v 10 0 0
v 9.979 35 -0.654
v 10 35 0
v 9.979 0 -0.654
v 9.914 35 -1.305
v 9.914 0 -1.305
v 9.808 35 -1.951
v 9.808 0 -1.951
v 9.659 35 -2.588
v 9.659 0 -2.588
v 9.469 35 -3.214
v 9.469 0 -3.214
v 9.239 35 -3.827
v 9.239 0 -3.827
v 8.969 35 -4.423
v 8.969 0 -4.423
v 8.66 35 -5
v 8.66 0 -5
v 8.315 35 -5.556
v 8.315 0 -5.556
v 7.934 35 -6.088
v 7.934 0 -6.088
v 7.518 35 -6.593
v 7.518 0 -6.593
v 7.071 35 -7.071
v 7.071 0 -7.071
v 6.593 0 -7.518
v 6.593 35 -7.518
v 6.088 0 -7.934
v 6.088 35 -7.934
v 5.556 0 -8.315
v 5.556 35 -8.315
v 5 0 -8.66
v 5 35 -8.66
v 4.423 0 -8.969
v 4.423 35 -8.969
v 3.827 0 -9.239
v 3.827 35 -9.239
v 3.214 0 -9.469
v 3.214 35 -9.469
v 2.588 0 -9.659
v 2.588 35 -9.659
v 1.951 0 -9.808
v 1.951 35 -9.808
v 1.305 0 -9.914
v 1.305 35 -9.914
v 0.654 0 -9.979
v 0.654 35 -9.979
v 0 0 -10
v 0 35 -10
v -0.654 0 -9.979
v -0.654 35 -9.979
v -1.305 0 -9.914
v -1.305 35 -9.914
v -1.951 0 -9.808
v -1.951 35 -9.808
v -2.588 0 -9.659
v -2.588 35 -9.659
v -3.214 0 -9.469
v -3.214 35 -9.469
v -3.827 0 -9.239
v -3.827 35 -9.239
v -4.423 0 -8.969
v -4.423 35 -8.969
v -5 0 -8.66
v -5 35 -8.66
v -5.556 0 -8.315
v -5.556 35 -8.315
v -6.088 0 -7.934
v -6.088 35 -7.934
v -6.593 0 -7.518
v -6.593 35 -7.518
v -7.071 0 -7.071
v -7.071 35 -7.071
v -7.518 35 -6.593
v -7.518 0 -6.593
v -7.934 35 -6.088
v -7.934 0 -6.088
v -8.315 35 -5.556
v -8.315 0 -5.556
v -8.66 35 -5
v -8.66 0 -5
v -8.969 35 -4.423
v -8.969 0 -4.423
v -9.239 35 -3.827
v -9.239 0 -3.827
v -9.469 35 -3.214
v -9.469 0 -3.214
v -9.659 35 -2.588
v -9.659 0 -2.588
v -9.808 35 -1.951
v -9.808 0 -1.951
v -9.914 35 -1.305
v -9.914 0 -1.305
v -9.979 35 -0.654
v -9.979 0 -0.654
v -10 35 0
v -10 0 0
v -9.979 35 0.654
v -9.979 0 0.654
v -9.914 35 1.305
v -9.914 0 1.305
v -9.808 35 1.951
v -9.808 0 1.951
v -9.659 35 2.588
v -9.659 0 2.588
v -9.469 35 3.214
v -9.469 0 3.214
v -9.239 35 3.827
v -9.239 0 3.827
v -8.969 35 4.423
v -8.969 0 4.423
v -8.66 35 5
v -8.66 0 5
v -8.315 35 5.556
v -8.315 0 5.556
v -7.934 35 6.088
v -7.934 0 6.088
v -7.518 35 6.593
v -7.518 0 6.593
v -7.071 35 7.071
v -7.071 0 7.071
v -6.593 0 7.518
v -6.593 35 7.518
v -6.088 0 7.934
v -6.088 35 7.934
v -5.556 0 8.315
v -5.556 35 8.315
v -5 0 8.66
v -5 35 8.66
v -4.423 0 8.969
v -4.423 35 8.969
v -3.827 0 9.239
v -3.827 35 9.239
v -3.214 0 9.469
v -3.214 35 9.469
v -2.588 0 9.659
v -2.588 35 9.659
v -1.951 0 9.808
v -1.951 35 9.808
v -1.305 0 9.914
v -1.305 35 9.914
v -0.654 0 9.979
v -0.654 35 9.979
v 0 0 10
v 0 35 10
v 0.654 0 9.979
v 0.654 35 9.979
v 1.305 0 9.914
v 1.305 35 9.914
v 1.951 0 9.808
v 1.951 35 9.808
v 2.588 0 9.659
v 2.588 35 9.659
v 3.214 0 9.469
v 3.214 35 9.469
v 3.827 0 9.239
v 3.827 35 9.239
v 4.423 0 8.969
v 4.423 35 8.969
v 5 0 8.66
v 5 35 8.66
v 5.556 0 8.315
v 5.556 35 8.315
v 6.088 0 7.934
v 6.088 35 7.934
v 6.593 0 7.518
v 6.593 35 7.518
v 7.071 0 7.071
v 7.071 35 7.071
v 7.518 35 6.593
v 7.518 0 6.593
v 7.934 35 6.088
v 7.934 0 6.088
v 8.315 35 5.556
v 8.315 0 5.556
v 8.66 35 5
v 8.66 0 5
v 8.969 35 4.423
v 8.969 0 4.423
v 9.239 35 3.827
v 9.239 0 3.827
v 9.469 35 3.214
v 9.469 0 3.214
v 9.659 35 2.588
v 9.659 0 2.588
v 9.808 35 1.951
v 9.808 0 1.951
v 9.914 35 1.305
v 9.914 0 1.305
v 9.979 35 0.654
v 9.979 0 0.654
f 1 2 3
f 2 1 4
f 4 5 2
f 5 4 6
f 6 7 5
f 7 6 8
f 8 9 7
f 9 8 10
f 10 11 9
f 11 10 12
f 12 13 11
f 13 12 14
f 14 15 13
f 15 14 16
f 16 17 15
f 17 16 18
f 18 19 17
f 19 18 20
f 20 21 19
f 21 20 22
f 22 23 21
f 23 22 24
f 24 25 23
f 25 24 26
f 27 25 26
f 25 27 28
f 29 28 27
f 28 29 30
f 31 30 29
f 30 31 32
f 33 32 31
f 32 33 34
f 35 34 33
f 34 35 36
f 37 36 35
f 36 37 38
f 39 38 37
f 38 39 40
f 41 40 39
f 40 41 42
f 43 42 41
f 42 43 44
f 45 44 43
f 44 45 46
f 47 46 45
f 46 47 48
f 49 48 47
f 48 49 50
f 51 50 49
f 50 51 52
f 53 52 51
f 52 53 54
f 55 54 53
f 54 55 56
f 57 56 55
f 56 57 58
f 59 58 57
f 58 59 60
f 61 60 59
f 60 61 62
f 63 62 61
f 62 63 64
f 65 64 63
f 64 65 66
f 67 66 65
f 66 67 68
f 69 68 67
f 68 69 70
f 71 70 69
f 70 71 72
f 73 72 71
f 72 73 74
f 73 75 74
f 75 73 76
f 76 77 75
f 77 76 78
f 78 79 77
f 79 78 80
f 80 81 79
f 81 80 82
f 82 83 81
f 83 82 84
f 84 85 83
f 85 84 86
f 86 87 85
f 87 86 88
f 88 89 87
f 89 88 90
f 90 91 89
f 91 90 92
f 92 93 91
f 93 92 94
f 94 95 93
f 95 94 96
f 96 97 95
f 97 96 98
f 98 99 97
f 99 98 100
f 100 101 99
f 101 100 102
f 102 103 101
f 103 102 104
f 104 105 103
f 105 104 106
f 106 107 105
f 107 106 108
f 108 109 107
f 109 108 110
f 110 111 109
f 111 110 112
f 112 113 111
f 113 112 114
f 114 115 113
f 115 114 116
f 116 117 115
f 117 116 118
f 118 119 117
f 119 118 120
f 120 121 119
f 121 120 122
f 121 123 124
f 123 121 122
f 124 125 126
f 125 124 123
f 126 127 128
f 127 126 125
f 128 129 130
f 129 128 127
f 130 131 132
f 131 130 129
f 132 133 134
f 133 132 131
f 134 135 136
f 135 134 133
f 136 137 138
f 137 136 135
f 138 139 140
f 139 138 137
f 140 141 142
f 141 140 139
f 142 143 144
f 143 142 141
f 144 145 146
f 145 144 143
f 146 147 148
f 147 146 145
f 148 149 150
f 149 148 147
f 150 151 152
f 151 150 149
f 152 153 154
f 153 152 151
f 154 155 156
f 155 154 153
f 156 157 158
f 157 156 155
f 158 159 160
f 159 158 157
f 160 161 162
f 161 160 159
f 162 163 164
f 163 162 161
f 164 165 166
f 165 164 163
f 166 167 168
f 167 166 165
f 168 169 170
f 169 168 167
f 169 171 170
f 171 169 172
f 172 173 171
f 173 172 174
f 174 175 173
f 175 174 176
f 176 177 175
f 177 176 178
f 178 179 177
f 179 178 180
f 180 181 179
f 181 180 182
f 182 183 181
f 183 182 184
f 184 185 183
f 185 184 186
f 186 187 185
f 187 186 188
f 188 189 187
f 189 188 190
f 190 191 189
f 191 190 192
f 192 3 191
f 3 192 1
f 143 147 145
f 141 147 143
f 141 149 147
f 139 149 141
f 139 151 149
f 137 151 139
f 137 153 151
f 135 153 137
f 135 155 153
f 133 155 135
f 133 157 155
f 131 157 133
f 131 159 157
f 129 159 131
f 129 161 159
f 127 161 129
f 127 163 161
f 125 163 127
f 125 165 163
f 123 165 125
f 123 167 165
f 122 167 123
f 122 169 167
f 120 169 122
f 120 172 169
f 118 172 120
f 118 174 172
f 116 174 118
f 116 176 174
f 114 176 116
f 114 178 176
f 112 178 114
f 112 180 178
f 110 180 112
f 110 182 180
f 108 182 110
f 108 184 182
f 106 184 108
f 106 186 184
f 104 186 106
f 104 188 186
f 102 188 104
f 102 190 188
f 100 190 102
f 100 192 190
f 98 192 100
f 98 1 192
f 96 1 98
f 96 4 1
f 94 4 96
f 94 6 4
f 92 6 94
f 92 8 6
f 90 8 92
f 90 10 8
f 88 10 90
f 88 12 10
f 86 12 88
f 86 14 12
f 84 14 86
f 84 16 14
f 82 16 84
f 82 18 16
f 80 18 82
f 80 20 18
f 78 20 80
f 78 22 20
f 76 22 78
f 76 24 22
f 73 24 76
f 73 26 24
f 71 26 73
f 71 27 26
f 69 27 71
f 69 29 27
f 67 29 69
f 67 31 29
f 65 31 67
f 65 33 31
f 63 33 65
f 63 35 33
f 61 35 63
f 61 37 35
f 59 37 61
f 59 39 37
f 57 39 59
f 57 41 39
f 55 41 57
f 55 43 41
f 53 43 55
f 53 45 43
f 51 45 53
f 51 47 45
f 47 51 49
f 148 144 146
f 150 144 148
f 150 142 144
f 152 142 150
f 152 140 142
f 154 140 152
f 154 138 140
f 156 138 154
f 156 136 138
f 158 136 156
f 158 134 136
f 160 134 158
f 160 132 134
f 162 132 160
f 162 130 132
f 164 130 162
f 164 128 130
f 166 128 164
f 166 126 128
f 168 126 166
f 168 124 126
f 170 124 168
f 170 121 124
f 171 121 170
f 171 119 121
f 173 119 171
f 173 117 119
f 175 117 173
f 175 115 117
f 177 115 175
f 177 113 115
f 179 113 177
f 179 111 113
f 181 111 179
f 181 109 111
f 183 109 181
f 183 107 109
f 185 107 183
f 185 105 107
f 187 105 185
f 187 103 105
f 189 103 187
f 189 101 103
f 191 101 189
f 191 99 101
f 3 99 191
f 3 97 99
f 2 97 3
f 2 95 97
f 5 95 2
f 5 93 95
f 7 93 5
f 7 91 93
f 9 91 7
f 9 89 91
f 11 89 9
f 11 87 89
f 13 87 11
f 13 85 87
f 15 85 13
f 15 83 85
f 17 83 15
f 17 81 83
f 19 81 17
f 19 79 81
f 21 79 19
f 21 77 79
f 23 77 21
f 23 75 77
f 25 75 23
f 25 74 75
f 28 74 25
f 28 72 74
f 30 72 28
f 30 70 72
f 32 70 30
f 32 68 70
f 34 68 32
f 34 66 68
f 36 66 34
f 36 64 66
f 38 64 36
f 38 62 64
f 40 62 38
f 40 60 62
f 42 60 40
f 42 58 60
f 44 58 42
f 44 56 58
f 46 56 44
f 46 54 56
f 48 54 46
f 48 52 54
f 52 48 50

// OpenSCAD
// Auto-generated from tests/data/feature_fixtures_manifest.json
// fixture: cylinder_y_axis
// fixture_type: cylinder
// description: Solid cylinder along y-axis to exercise non-z cylinder detection.
$fn = 96;

diameter = 20.000000;
height = 35.000000;

rotate([-90, 0, 0]) cylinder(h=height, d=diameter, center=false);
